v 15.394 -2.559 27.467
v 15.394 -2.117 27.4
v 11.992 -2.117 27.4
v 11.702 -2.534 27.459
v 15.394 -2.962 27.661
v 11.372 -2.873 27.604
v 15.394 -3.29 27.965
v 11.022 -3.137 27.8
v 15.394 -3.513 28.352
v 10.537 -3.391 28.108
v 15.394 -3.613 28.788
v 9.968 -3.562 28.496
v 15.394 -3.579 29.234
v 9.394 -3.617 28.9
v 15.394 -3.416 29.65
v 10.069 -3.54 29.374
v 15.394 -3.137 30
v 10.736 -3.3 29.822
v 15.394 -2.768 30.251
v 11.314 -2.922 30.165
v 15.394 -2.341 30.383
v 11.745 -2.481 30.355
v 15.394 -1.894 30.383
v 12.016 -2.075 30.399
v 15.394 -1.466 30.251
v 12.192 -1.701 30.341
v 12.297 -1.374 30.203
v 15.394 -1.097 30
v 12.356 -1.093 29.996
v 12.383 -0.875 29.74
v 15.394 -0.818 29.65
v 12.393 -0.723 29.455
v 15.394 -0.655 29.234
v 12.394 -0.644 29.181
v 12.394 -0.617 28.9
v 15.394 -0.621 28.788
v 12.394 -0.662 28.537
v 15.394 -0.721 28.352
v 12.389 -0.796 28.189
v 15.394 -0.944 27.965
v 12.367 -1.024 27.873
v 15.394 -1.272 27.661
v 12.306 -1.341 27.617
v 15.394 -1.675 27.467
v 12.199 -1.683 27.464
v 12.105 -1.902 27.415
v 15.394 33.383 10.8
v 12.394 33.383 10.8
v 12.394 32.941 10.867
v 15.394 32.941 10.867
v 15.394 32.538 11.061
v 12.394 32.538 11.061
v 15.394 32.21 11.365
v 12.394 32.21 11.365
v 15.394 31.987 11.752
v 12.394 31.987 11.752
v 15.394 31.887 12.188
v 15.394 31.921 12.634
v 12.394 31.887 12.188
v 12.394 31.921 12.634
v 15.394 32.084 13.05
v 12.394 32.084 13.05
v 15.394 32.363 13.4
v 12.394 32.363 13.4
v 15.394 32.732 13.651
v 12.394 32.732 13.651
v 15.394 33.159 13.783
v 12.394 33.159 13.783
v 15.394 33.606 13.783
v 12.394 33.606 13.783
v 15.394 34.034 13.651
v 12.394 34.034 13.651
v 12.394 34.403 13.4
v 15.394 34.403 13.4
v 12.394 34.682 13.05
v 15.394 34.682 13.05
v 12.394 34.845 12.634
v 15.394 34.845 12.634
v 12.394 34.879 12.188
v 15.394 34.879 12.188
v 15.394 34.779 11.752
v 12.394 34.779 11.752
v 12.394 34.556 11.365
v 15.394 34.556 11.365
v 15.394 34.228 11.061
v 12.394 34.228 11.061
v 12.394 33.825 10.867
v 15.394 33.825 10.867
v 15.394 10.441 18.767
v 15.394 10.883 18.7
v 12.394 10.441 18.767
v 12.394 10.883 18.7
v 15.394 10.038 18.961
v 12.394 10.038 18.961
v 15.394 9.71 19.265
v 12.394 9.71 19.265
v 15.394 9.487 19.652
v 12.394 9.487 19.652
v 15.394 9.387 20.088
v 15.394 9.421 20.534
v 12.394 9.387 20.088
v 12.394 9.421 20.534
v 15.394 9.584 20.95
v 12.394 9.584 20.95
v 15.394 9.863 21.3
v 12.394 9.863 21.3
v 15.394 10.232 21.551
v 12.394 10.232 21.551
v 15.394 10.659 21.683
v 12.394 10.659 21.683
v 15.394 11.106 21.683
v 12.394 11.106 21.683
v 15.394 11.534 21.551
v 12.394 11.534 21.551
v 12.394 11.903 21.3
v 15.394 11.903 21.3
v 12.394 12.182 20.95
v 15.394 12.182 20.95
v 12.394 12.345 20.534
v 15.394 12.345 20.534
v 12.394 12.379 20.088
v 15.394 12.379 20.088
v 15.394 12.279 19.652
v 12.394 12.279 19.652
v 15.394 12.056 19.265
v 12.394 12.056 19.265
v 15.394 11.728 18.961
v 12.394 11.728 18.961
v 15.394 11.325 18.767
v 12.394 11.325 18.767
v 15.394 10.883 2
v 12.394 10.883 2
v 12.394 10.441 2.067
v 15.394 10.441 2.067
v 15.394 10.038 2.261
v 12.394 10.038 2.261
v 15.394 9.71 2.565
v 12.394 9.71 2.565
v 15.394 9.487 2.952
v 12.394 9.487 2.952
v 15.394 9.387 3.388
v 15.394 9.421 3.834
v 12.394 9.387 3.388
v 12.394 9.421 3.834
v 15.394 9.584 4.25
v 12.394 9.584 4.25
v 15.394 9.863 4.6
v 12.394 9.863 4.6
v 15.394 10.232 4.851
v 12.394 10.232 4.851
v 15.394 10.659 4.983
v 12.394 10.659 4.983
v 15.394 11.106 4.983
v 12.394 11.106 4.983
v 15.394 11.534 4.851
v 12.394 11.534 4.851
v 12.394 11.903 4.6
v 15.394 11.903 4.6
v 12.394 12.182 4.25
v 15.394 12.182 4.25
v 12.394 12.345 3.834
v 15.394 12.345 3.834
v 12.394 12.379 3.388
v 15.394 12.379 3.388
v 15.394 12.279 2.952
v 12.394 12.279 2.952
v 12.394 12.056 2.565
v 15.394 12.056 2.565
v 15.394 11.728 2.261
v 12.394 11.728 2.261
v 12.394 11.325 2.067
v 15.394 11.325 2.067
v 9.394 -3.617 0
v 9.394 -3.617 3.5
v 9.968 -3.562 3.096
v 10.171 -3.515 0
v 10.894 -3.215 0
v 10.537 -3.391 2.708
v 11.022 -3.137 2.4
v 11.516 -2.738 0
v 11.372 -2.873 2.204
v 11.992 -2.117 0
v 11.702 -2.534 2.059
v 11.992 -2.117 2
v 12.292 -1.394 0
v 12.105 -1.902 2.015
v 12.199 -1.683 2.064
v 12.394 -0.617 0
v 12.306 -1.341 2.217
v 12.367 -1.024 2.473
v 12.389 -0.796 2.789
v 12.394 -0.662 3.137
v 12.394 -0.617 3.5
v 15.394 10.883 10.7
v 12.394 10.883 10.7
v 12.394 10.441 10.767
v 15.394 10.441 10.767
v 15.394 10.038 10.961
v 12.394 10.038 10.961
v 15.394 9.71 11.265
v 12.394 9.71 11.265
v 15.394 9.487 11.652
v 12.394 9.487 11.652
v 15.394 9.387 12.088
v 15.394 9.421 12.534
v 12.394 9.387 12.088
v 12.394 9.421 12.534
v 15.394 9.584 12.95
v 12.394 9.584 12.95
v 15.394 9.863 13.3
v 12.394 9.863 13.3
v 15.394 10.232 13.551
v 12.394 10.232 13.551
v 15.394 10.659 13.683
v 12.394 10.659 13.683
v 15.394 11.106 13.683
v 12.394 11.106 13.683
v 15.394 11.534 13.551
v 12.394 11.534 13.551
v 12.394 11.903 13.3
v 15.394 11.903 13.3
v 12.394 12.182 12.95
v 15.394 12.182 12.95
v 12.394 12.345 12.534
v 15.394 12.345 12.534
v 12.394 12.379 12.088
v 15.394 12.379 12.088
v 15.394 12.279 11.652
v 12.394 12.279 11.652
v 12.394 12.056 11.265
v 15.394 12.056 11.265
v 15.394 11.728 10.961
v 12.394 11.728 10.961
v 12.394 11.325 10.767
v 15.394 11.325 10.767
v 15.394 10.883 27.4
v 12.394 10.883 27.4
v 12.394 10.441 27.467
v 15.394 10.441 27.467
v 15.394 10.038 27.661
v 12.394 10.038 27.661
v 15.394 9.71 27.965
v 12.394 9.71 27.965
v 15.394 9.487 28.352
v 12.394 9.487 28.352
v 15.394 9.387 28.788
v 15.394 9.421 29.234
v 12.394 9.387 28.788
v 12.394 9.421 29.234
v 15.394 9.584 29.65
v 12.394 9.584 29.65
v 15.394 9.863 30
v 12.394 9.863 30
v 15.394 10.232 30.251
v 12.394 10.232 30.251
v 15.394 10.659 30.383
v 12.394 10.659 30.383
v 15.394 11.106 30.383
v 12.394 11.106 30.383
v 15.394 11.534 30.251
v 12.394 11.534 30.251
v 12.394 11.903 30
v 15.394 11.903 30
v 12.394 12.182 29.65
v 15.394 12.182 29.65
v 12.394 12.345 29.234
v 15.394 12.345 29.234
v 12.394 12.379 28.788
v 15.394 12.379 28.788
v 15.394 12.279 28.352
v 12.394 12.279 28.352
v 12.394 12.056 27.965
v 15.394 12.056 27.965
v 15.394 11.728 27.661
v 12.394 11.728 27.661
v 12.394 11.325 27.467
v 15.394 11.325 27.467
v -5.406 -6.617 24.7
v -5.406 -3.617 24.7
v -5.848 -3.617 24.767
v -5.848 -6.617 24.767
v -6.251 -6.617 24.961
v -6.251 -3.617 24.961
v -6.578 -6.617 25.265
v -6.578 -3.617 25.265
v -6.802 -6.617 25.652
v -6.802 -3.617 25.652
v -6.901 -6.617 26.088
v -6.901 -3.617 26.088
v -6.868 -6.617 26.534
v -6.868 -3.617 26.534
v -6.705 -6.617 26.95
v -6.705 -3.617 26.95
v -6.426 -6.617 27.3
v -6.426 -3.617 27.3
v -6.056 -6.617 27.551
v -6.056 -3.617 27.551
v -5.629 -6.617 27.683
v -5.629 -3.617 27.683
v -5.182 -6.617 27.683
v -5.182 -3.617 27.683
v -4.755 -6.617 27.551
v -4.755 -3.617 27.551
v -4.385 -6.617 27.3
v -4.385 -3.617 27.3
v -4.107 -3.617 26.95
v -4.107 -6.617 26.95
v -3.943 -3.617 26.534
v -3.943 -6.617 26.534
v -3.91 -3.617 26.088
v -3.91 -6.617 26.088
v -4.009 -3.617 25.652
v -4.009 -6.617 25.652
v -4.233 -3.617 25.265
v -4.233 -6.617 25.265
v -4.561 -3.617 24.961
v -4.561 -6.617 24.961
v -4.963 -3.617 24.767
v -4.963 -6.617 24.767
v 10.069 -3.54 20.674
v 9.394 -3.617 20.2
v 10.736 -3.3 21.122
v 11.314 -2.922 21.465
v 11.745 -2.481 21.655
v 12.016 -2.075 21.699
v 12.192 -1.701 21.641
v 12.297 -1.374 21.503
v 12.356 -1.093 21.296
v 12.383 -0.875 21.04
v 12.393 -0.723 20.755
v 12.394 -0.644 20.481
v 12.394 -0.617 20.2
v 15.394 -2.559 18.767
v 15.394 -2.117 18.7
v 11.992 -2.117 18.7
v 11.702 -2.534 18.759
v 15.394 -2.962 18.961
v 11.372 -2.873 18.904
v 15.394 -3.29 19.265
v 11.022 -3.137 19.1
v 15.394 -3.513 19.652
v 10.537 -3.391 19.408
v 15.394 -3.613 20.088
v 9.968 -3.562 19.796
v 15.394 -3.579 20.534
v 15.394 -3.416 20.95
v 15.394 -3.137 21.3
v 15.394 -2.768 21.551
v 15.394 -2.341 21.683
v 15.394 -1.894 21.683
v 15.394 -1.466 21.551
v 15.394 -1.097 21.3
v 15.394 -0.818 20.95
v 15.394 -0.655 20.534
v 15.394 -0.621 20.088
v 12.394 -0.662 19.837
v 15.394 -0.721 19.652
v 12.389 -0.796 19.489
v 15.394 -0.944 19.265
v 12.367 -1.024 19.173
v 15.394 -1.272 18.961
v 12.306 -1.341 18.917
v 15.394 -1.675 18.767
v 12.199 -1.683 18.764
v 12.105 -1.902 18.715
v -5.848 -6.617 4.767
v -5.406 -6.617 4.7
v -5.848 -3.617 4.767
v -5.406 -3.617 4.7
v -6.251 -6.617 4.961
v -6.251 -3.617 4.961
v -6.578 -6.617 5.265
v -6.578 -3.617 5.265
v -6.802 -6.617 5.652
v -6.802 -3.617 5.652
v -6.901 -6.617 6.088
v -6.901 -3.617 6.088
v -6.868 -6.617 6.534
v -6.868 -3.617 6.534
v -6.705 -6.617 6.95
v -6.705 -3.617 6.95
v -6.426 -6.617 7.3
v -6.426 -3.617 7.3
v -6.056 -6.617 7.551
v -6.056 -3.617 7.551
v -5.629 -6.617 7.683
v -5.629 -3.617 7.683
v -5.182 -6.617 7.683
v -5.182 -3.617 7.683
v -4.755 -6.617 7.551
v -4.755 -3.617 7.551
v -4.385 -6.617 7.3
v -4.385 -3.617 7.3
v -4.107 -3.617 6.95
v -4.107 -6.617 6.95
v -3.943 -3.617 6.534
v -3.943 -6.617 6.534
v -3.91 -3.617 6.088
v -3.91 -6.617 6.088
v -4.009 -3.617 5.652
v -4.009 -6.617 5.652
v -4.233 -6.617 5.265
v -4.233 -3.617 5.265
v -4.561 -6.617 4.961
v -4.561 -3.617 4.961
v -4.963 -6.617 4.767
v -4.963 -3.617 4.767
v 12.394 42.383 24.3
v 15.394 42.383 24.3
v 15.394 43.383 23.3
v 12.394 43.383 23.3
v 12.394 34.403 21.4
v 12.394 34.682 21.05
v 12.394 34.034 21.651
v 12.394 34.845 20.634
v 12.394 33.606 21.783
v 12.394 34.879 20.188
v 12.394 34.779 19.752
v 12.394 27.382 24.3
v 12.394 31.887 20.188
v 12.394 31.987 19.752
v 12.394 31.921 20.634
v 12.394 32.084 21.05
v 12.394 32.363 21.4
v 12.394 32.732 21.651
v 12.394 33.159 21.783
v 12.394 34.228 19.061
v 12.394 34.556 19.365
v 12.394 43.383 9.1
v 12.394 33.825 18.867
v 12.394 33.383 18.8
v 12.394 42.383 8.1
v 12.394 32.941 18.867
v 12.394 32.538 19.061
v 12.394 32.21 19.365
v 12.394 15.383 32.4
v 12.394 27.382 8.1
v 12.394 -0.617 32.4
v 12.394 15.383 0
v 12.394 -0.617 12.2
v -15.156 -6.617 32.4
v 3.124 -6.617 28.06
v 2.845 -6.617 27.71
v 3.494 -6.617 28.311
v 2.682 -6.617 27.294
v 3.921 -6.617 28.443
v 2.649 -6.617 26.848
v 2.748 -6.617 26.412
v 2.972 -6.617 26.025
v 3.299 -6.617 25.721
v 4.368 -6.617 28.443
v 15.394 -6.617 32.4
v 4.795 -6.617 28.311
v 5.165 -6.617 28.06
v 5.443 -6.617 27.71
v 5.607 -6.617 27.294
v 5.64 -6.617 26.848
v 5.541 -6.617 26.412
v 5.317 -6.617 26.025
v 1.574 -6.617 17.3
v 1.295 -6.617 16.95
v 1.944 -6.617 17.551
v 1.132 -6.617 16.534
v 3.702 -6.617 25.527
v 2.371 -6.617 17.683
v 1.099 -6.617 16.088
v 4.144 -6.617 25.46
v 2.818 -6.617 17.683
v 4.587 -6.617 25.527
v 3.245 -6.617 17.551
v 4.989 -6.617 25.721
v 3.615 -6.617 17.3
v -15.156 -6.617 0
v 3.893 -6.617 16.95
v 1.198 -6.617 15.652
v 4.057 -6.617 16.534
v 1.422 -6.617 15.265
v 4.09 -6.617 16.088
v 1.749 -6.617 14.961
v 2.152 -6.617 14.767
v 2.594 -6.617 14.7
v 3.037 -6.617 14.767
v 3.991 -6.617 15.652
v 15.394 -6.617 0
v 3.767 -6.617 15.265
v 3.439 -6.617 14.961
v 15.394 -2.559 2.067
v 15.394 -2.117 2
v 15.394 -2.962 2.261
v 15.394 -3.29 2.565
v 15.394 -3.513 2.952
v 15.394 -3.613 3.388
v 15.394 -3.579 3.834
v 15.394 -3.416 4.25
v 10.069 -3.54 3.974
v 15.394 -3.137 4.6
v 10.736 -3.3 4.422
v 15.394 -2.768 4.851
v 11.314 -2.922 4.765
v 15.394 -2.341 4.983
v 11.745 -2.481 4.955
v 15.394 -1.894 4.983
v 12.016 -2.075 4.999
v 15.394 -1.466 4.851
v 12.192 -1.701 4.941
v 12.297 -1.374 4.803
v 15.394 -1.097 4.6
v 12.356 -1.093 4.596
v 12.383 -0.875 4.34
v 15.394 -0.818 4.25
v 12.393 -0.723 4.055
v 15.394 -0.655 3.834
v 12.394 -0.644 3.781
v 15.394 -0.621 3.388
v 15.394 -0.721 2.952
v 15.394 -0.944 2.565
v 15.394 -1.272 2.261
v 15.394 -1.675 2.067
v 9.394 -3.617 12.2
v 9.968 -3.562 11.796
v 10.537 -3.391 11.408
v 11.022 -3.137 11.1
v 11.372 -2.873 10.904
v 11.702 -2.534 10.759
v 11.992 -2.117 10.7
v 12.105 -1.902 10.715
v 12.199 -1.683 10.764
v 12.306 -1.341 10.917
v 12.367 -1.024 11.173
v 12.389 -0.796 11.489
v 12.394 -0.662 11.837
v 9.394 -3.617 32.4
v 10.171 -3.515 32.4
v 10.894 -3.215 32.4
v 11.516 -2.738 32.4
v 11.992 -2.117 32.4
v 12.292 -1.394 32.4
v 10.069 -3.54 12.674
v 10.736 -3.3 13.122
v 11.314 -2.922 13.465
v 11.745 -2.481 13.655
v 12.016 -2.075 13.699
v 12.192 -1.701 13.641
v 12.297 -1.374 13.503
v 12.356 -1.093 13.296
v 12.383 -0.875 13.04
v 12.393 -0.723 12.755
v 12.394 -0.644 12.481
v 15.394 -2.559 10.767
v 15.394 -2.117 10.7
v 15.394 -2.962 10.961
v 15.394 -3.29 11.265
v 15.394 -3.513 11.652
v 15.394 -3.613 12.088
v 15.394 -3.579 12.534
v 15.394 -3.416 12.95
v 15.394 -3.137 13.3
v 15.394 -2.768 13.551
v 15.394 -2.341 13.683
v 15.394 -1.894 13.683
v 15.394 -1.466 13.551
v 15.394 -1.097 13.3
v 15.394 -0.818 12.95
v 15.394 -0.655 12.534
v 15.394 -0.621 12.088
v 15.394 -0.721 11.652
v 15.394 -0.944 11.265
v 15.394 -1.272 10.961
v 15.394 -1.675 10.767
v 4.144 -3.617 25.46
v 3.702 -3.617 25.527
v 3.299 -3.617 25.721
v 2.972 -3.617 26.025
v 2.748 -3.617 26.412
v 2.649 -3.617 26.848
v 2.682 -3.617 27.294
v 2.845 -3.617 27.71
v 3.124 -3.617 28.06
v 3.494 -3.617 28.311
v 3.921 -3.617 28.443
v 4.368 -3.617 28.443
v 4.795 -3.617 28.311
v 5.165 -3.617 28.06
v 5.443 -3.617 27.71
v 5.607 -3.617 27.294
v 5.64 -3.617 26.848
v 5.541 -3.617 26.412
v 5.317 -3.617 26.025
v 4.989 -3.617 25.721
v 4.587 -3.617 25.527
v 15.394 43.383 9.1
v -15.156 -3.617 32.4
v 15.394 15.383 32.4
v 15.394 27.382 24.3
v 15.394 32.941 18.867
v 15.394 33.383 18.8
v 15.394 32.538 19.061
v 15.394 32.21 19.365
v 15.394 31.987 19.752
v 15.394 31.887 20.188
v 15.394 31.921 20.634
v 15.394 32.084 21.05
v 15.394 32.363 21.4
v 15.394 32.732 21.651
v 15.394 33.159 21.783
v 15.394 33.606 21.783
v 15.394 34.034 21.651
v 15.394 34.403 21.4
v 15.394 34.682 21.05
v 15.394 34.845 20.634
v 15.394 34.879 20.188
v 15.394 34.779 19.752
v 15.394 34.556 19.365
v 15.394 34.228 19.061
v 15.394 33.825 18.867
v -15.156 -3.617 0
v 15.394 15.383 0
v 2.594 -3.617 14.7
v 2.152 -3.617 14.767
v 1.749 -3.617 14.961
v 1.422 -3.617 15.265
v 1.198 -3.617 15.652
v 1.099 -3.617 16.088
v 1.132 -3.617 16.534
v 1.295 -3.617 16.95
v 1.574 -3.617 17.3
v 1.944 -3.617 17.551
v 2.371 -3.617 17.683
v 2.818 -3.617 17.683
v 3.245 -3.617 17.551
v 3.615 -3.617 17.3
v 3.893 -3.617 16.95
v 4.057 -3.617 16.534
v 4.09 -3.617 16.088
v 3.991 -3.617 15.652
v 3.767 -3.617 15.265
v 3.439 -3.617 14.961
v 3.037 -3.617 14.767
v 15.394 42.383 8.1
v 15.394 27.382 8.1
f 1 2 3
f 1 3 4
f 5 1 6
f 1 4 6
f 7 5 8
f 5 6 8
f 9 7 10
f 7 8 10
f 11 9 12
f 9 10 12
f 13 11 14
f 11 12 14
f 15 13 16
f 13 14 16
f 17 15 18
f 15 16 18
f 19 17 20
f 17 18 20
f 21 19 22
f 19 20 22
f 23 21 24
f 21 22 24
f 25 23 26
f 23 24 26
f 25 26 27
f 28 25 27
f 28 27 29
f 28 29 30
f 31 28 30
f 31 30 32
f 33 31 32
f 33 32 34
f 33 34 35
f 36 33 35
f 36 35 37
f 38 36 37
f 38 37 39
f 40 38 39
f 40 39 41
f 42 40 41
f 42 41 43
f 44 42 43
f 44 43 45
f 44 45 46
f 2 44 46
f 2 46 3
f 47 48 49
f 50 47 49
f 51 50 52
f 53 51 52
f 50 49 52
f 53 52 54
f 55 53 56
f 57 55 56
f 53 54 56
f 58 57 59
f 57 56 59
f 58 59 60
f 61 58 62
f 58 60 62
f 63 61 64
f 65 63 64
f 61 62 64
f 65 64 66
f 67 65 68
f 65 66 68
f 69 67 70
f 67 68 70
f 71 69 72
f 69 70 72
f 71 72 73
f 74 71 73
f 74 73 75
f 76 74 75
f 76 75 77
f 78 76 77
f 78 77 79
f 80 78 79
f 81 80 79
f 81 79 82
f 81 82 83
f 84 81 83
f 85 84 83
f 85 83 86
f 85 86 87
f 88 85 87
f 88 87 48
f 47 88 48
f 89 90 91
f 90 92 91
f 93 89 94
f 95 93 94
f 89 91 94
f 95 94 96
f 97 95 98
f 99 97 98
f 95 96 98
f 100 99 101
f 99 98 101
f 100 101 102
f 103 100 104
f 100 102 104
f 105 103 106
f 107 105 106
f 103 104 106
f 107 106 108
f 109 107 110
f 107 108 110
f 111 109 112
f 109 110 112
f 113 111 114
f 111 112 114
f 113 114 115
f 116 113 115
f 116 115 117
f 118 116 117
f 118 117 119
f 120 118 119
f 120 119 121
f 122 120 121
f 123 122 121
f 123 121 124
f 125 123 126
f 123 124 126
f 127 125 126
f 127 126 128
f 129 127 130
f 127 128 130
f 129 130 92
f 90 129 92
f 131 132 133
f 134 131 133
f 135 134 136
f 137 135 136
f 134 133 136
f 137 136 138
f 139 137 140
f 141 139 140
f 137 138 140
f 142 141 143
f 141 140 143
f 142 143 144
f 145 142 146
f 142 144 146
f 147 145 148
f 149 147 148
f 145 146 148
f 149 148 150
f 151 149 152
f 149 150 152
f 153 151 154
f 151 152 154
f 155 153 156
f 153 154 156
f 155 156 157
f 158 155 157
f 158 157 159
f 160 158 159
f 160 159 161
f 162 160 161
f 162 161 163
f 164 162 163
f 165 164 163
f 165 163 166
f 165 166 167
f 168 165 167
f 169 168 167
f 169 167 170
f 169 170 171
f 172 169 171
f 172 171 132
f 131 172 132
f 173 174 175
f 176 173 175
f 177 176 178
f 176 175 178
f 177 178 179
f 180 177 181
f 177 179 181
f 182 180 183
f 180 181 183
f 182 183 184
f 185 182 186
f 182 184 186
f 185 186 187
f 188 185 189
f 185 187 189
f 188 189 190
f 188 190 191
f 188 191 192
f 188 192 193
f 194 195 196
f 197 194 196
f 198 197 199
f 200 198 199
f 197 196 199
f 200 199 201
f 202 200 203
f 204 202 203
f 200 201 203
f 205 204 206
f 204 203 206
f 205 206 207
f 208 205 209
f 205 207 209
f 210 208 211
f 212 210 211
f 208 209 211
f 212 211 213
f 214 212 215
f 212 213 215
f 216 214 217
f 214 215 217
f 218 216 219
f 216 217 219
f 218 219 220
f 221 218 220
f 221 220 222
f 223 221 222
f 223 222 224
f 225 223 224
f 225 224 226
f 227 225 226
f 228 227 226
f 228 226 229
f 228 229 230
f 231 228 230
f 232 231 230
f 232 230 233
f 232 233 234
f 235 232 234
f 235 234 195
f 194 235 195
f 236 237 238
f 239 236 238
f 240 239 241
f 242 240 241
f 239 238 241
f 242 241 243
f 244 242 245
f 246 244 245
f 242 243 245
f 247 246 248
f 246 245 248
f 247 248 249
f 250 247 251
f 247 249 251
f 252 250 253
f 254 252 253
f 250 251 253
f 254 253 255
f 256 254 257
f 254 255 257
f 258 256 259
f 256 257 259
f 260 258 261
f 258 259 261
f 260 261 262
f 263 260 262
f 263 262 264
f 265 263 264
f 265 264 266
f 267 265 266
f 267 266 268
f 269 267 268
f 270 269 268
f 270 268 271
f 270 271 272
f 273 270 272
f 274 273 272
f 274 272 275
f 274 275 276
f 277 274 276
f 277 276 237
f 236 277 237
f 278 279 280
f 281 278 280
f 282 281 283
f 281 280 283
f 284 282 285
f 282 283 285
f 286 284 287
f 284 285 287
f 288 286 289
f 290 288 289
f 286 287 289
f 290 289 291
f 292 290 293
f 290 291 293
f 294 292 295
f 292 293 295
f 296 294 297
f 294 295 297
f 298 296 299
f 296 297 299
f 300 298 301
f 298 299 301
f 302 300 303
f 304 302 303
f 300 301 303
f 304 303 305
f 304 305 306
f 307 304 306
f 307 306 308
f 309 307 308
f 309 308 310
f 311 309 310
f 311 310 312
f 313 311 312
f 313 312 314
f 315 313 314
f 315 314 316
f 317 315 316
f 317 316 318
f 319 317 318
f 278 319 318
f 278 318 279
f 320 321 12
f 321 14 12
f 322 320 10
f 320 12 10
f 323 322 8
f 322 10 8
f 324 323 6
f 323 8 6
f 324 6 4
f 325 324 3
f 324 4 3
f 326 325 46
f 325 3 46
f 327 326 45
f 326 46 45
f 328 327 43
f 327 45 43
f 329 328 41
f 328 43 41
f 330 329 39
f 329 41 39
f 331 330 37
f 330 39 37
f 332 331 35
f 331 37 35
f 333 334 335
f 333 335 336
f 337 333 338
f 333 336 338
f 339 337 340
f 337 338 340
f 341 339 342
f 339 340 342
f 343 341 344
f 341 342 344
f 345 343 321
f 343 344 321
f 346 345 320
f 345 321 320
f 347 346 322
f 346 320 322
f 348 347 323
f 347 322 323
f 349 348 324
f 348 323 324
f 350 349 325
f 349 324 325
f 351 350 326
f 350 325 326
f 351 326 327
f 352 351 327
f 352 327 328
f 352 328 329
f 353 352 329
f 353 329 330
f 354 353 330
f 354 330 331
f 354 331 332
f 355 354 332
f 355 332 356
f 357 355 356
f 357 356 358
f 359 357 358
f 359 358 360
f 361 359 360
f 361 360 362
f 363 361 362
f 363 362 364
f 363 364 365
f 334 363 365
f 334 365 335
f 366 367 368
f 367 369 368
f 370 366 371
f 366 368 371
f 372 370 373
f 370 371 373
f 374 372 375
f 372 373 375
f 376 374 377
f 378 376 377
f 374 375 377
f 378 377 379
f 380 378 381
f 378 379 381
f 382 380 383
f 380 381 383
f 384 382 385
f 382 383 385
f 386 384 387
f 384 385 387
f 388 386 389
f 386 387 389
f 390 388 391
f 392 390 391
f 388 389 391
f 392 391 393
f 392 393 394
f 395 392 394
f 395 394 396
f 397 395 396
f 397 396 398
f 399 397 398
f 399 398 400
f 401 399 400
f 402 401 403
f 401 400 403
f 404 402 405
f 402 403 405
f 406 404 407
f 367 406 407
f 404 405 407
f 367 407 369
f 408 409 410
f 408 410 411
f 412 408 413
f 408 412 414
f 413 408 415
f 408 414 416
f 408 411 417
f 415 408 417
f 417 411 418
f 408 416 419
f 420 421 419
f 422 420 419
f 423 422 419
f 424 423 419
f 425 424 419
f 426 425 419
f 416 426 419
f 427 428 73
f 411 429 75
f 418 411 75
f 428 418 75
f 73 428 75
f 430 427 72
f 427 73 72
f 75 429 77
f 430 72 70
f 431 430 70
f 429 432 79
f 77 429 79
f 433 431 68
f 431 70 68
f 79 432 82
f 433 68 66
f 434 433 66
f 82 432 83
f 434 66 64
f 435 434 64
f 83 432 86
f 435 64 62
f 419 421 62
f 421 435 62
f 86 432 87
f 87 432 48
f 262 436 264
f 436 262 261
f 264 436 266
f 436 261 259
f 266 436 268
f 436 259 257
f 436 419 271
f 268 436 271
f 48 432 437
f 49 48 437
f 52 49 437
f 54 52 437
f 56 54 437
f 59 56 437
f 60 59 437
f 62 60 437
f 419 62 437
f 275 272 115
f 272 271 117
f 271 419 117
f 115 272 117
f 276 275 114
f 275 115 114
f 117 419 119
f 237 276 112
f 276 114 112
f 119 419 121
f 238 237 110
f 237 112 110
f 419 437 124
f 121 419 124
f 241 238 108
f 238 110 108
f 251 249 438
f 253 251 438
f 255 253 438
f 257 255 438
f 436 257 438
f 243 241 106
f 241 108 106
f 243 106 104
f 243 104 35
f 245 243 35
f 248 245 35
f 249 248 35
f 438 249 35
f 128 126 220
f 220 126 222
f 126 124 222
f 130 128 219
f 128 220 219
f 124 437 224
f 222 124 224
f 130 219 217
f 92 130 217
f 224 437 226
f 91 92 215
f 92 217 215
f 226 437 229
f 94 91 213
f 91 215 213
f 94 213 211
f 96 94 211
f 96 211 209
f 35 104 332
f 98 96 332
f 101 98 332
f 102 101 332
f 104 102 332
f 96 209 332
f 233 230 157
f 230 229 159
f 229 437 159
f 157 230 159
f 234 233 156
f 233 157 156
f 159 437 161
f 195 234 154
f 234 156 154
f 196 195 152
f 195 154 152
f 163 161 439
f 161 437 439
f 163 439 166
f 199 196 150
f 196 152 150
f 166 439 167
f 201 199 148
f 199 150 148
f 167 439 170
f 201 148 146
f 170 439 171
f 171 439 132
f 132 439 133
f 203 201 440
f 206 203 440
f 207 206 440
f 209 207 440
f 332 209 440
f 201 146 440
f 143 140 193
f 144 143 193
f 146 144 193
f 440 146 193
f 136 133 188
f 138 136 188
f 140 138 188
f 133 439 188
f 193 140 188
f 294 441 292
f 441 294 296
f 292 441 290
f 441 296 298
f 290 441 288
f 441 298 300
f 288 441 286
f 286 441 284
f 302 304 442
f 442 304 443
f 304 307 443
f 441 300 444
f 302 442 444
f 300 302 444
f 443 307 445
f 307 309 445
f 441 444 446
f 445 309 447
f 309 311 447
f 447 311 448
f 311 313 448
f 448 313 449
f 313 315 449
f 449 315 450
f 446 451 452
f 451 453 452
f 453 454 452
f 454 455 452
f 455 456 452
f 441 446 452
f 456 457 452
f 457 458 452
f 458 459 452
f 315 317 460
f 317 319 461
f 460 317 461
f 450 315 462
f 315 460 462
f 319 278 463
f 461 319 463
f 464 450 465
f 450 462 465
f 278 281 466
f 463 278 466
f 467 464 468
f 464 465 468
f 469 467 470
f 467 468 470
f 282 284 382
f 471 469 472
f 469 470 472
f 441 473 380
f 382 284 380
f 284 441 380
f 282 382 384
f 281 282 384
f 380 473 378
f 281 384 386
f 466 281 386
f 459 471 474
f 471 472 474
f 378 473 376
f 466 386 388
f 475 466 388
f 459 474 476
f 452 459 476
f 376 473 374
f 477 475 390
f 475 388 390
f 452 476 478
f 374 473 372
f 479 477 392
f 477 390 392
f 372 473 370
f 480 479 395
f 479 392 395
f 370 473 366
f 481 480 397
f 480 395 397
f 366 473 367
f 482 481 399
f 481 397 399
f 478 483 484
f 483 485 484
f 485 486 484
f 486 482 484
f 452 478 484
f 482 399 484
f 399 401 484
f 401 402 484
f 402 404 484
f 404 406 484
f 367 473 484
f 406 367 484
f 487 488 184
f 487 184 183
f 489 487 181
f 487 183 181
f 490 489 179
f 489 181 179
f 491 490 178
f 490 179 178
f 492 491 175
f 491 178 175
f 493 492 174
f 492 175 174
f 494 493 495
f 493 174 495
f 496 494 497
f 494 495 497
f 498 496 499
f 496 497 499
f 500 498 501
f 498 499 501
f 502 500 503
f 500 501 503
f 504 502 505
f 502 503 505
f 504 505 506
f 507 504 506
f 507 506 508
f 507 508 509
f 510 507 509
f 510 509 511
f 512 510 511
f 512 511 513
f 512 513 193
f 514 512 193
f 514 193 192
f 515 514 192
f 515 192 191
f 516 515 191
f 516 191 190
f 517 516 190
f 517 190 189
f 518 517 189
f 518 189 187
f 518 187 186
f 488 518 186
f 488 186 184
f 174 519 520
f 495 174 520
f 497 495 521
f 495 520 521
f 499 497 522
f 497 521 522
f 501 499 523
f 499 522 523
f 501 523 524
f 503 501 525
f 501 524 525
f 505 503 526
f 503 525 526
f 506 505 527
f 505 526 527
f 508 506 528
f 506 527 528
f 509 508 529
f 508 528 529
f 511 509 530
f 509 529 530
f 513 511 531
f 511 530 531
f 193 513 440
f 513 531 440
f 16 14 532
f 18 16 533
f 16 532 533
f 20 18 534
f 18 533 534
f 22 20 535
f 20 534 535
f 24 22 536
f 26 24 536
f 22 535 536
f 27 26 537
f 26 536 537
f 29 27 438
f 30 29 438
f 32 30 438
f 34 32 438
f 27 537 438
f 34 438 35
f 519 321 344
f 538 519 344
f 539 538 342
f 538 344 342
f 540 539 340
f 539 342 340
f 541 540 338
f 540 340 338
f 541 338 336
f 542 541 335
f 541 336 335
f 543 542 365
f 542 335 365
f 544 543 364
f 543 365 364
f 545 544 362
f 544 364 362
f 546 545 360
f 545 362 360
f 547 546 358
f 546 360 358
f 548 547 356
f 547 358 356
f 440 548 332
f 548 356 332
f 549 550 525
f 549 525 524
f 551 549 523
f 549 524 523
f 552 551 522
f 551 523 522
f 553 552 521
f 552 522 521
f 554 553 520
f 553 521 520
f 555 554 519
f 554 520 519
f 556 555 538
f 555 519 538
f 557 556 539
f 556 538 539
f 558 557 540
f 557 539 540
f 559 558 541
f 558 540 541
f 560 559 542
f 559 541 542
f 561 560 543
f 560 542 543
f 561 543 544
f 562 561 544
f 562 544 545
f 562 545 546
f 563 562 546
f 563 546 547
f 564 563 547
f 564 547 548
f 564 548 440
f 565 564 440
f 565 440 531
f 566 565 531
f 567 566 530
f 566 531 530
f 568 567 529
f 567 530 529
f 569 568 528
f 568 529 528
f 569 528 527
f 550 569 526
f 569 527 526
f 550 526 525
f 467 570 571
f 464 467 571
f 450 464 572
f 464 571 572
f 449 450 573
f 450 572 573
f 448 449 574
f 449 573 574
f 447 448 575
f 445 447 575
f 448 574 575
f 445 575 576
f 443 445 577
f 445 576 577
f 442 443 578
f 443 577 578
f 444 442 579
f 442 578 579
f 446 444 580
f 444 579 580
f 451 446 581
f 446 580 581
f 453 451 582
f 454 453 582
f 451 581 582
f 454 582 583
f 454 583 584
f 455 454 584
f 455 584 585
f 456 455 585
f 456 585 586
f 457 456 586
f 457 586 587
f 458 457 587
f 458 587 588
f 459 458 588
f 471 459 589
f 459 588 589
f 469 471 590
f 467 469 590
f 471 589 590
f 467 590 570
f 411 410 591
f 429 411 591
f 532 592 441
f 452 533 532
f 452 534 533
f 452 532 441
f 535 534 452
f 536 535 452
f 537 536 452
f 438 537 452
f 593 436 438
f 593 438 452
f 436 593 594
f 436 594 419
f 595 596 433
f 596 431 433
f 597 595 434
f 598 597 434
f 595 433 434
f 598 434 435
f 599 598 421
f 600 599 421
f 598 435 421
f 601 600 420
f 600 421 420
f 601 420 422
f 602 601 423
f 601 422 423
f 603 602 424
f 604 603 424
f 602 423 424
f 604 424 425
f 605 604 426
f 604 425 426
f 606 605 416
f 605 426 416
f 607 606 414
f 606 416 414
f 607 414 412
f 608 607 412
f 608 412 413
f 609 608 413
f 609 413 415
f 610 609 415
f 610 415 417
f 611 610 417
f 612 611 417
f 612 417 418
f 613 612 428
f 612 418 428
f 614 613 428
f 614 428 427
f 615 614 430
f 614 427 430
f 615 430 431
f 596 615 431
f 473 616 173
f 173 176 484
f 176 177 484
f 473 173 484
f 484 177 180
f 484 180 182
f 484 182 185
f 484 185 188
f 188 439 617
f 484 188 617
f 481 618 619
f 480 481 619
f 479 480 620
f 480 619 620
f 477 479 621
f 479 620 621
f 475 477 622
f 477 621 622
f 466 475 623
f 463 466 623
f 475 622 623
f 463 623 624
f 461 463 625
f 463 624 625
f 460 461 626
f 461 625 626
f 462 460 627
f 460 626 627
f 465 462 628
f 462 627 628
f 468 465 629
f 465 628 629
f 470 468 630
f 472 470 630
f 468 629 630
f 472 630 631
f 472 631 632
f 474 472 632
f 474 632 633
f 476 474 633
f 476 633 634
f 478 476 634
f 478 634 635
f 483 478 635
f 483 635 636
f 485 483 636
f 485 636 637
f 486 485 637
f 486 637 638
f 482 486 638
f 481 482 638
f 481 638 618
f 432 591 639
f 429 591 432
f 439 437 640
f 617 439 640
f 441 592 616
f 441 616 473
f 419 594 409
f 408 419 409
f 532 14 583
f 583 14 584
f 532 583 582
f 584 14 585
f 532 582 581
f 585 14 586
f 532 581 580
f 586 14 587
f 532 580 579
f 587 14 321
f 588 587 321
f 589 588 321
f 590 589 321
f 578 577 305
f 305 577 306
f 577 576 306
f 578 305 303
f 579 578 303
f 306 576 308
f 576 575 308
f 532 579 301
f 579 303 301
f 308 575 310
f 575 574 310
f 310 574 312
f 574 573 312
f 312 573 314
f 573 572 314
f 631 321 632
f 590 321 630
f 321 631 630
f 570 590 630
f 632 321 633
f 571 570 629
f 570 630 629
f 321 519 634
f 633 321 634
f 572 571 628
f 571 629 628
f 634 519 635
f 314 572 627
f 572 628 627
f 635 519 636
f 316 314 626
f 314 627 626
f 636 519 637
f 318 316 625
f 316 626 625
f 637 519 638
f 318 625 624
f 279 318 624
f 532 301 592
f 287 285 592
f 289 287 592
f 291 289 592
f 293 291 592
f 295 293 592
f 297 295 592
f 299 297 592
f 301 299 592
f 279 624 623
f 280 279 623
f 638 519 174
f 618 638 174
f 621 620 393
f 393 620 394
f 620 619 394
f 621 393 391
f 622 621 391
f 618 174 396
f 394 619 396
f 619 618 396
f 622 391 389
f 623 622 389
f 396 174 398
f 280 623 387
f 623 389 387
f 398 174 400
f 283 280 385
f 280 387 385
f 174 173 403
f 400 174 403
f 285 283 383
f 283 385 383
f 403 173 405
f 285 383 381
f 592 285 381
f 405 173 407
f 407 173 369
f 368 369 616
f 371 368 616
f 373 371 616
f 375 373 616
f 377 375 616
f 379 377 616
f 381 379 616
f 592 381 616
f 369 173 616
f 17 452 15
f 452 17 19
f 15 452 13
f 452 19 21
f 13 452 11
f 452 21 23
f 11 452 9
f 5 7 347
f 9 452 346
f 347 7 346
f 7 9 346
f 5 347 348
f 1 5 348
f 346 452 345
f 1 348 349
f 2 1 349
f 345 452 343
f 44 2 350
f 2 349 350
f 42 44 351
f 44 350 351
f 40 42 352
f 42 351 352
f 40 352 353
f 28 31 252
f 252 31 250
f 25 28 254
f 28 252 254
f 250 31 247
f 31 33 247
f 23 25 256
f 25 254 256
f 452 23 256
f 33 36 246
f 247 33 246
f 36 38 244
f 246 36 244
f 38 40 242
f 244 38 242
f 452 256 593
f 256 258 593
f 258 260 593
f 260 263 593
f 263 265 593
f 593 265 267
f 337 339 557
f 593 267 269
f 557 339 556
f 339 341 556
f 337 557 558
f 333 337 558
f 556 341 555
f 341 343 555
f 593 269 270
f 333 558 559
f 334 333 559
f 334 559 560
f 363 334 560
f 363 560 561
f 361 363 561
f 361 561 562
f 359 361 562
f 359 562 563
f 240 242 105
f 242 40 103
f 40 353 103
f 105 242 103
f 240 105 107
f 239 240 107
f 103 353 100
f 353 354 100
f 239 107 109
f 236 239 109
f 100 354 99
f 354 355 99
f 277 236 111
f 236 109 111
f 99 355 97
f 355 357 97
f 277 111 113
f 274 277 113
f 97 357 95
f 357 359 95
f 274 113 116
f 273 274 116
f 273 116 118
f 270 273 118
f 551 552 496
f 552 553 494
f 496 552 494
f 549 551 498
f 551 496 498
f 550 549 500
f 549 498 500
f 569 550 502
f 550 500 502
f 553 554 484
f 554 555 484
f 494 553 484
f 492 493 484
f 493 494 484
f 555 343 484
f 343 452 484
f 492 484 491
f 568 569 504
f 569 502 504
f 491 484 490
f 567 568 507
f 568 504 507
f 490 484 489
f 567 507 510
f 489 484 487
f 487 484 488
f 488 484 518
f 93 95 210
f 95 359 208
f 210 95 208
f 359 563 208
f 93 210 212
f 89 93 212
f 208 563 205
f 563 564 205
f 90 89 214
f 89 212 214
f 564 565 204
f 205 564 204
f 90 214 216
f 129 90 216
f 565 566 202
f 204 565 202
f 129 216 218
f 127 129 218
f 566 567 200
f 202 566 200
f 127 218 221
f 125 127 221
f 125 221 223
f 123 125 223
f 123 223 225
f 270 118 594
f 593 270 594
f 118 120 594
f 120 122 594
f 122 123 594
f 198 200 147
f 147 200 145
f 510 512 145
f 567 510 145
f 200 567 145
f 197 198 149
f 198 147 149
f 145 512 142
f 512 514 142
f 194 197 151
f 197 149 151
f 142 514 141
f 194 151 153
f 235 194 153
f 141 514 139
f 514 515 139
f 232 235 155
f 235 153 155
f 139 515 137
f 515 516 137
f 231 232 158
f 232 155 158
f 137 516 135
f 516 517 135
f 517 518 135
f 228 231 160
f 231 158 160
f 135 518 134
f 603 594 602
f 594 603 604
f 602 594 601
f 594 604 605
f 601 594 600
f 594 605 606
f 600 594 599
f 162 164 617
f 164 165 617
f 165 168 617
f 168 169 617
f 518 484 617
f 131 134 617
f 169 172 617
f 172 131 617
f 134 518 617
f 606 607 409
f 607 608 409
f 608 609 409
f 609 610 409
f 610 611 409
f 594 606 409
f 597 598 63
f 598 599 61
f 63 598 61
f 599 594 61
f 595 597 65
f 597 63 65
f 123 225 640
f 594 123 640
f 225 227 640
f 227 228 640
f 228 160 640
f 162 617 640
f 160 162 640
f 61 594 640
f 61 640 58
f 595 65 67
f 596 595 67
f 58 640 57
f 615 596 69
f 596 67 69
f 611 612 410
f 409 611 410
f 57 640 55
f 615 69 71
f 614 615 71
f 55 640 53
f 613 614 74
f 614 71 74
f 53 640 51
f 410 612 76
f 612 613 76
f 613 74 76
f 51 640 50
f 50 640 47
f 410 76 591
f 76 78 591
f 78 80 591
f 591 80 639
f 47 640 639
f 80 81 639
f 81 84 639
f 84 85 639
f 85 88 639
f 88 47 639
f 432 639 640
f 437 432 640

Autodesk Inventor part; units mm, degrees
ref_plane "YZ Plane" through (0, 0, 0) normal (1, 0, 0) x (0, 1, 0)
ref_plane "XZ Plane" through (0, 0, 0) normal (0, 1, 0) x (-1, 0, 0)
ref_plane "XY Plane" through (0, 0, 0) normal (0, 0, 1) x (1, 0, 0)
sketch "Szkic1" plane through (0, 0, 0) normal (0, 0, 1) x (1, 0, 0)
  line L0 (-15.1556, -3.6171) -> (-15.1556, -6.6171)
  line L1 (-15.1556, -6.6171) -> (15.3944, -6.6171)
  line L2 (15.3944, -6.6171) -> (15.3944, 15.3829)
  line L3 (15.3944, 15.3829) -> (12.3944, 15.3829)
  line L4 (12.3944, 15.3829) -> (12.3944, -3.6171)
  line L5 (12.3944, -3.6171) -> (-15.1556, -3.6171)
  point P0 (0, 0)
  dimension "d0" = 3
  dimension "d1" = 30.55
  dimension "d2" = 22
  dimension "d3" = 3
extrude "Wyciągnięcie proste1" add sketch "Szkic1" along normal blind 32.4
fillet "Zaokrąglenie1" radius 3 1 edges at (12.3944, -3.6171, 16.2)
sketch "Szkic3" plane through (15.3944, -6.6171, 32.4) normal (1, 0, 0) x (0, 0, -1)
  line L0 (32.4, 22) -> (0, 22) projected
  line L1 (0, 0) -> (0, 22) projected
  line L2 (32.4, 0) -> (0, 0) projected
  line L3 (32.4, 0) -> (32.4, 22) projected
  line L4 (32.4, 22) -> (0, 22) projected
  line L5 (24.3, 22) -> (8.1, 22)
  line L6 (8.1, 22) -> (8.1, 50)
  line L7 (8.1, 50) -> (24.3, 50)
  line L8 (24.3, 50) -> (24.3, 22)
  point P0 (32.4, 6.6171)
  dimension "d48" = 16.2
  dimension "d49" = 28
  dimension "d50" = 32.4
  dimension "d51" = 8.1
extrude "Wyciągnięcie proste3" add sketch "Szkic3" against normal blind 3 contours L0 L6 L7 L8
sketch "Szkic4" plane through (-15.1556, -6.6171, 0) normal (0, -1, 0) x (1, 0, 0)
  line L0 (0, 0) -> (30.55, 0) projected
  line L1 (30.55, 0) -> (30.55, 32.4) projected
  line L2 (0, 32.4) -> (30.55, 32.4) projected
  line L3 (0, 0) -> (0, 32.4) projected
  point P0 (15.1556, 0)
  point P1 (9.75, 26.2)
  point P2 (9.75, 6.2)
  point P3 (17.75, 16.2)
  dimension "d37" = 9.75
  dimension "d38" = 9.75
  dimension "d39" = 6.2
  dimension "d40" = 6.2
  dimension "d69" = 32.4
  dimension "d70" = 16.2
  dimension "d71" = 17.75
hole "Otwór2" at (-5.4056, -6.6171, 26.2) at (-5.4056, -6.6171, 6.2) at (2.5944, -6.6171, 16.2) direction (0, 1, 0) diameter 3 end through all
sketch "Szkic5" plane through (15.3944, -6.6171, 0) normal (1, 0, 0) x (0, 0, -1)
  line L0 (0, 0) -> (0, 22) projected
  line L1 (0, 22) -> (-8.1, 22) projected
  line L2 (-8.1, 22) -> (-8.1, 50) projected
  line L3 (-8.1, 50) -> (-24.3, 50) projected
  line L4 (-24.3, 50) -> (-24.3, 22) projected
  line L5 (-24.3, 22) -> (-32.4, 22) projected
  line L6 (-32.4, 0) -> (-32.4, 22) projected
  line L7 (0, 0) -> (-32.4, 0) projected
  point P0 (0, 6.6171)
  point P1 (-12.3, 40)
  point P2 (-20.3, 40)
  dimension "d52" = 10
  dimension "d53" = 10
  dimension "d54" = 4
  dimension "d55" = 4.2
hole "Otwór3" at (15.3944, 33.3829, 12.3) at (15.3944, 33.3829, 20.3) direction (-1, 0, 0) diameter 3 end through all
chamfer "Faza2" distance 1 angle 45 2 edges at (13.8944, 43.3829, 24.3) (13.8944, 43.3829, 8.1)
chamfer "Faza4" distance 8.1 distance2 12 1 edges at (13.8944, 15.3829, 24.3) measured on face at (14.3944, 15.3829, 27)
chamfer "Faza5" distance 8.1 distance2 12 1 edges at (13.8944, 15.3829, 8.1) measured on face at (14.3944, 15.3829, 2.7)
sketch "Szkic6" plane through (15.3944, -6.6171, 32.4) normal (1, 0, 0) x (0, 0, -1)
  circle A0 centre (20.1, 40) radius 1.5 projected
  circle A1 centre (12.1, 40) radius 1.5 projected
  line L0 (23.3, 50) -> (24.3, 49) projected
  line L1 (23.3, 50) -> (9.1, 50) projected
  line L2 (8.1, 49) -> (9.1, 50) projected
  line L3 (8.1, 49) -> (8.1, 34) projected
  line L4 (0, 22) -> (8.1, 34) projected
  line L5 (0, 0) -> (0, 22) projected
  line L6 (32.4, 0) -> (0, 0) projected
  line L7 (32.4, 0) -> (32.4, 22) projected
  line L8 (24.3, 34) -> (32.4, 22) projected
  line L9 (24.3, 34) -> (24.3, 49) projected
  point P0 (32.4, 6.6171)
  point P1 (3.5, 17.5)
  point P2 (3.5, 4.5)
  point P3 (28.9, 17.5)
  point P4 (28.9, 4.5)
  point P5 (35.2902, 42.5614)
  point P6 (12.2, 17.5)
  point P7 (12.2, 4.5)
  point P8 (20.2, 17.5)
  point P9 (20.2, 4.5)
  dimension "d79" = 3.5
  dimension "d80" = 3.5
  dimension "d81" = 3.5
  dimension "d82" = 3.5
  dimension "d83" = 4.5
  dimension "d84" = 4.5
  dimension "d85" = 13
  dimension "d86" = 13
  dimension "d87" = 8.7
  dimension "d88" = 8.7
  dimension "d89" = 8.7
  dimension "d90" = 8.7
hole "Otwór4" at (15.3944, 10.8829, 28.9) at (15.3944, -2.1171, 28.9) at (15.3944, 10.8829, 3.5) at (15.3944, -2.1171, 3.5) at (15.3944, 35.9442, -2.8902) at (15.3944, 10.8829, 20.2) at (15.3944, -2.1171, 20.2) at (15.3944, 10.8829, 12.2) at (15.3944, -2.1171, 12.2) direction (-1, 0, 0) diameter 3 end through all
sketch "Szkic7" plane through (-15.1556, -6.6171, 0) normal (0, -1, 0) x (1, 0, 0)
  circle A0 centre (9.75, 6.2) radius 1.5 projected
  circle A1 centre (9.75, 26.2) radius 1.5 projected
  circle A2 centre (17.75, 16.2) radius 1.5 projected
  line L0 (0, 0) -> (30.55, 0) projected
  line L1 (30.55, 0) -> (30.55, 32.4) projected
  line L2 (0, 32.4) -> (30.55, 32.4) projected
  line L3 (0, 0) -> (0, 32.4) projected
  point P0 (15.1556, 0)
  point P1 (19.3, 26.96)
  dimension "d98" = 5.44
  dimension "d99" = 19.3
hole "Otwór5" at (4.1444, -6.6171, 26.96) direction (0, 1, 0) diameter 3 depth 8 tip angle 118
equation "\"d51\" = -0.5 * d48 + 0.5 * d50"
equation "\"d38\" = d37"
equation "\"d40\" = d39"
equation "\"d70\" = 0.5 * d69"
equation "\"d53\" = d52"
equation "\"d80\" = d79"
equation "\"d81\" = d79"
equation "\"d82\" = d79"
equation "\"d84\" = d83"
equation "\"d86\" = d85"
equation "\"d88\" = d87"
equation "\"d89\" = d87"
equation "\"d90\" = d87"
properties part number "CNCM_X_Axiss_Carriage_Belt_and_Cable_Chain_Mount"
